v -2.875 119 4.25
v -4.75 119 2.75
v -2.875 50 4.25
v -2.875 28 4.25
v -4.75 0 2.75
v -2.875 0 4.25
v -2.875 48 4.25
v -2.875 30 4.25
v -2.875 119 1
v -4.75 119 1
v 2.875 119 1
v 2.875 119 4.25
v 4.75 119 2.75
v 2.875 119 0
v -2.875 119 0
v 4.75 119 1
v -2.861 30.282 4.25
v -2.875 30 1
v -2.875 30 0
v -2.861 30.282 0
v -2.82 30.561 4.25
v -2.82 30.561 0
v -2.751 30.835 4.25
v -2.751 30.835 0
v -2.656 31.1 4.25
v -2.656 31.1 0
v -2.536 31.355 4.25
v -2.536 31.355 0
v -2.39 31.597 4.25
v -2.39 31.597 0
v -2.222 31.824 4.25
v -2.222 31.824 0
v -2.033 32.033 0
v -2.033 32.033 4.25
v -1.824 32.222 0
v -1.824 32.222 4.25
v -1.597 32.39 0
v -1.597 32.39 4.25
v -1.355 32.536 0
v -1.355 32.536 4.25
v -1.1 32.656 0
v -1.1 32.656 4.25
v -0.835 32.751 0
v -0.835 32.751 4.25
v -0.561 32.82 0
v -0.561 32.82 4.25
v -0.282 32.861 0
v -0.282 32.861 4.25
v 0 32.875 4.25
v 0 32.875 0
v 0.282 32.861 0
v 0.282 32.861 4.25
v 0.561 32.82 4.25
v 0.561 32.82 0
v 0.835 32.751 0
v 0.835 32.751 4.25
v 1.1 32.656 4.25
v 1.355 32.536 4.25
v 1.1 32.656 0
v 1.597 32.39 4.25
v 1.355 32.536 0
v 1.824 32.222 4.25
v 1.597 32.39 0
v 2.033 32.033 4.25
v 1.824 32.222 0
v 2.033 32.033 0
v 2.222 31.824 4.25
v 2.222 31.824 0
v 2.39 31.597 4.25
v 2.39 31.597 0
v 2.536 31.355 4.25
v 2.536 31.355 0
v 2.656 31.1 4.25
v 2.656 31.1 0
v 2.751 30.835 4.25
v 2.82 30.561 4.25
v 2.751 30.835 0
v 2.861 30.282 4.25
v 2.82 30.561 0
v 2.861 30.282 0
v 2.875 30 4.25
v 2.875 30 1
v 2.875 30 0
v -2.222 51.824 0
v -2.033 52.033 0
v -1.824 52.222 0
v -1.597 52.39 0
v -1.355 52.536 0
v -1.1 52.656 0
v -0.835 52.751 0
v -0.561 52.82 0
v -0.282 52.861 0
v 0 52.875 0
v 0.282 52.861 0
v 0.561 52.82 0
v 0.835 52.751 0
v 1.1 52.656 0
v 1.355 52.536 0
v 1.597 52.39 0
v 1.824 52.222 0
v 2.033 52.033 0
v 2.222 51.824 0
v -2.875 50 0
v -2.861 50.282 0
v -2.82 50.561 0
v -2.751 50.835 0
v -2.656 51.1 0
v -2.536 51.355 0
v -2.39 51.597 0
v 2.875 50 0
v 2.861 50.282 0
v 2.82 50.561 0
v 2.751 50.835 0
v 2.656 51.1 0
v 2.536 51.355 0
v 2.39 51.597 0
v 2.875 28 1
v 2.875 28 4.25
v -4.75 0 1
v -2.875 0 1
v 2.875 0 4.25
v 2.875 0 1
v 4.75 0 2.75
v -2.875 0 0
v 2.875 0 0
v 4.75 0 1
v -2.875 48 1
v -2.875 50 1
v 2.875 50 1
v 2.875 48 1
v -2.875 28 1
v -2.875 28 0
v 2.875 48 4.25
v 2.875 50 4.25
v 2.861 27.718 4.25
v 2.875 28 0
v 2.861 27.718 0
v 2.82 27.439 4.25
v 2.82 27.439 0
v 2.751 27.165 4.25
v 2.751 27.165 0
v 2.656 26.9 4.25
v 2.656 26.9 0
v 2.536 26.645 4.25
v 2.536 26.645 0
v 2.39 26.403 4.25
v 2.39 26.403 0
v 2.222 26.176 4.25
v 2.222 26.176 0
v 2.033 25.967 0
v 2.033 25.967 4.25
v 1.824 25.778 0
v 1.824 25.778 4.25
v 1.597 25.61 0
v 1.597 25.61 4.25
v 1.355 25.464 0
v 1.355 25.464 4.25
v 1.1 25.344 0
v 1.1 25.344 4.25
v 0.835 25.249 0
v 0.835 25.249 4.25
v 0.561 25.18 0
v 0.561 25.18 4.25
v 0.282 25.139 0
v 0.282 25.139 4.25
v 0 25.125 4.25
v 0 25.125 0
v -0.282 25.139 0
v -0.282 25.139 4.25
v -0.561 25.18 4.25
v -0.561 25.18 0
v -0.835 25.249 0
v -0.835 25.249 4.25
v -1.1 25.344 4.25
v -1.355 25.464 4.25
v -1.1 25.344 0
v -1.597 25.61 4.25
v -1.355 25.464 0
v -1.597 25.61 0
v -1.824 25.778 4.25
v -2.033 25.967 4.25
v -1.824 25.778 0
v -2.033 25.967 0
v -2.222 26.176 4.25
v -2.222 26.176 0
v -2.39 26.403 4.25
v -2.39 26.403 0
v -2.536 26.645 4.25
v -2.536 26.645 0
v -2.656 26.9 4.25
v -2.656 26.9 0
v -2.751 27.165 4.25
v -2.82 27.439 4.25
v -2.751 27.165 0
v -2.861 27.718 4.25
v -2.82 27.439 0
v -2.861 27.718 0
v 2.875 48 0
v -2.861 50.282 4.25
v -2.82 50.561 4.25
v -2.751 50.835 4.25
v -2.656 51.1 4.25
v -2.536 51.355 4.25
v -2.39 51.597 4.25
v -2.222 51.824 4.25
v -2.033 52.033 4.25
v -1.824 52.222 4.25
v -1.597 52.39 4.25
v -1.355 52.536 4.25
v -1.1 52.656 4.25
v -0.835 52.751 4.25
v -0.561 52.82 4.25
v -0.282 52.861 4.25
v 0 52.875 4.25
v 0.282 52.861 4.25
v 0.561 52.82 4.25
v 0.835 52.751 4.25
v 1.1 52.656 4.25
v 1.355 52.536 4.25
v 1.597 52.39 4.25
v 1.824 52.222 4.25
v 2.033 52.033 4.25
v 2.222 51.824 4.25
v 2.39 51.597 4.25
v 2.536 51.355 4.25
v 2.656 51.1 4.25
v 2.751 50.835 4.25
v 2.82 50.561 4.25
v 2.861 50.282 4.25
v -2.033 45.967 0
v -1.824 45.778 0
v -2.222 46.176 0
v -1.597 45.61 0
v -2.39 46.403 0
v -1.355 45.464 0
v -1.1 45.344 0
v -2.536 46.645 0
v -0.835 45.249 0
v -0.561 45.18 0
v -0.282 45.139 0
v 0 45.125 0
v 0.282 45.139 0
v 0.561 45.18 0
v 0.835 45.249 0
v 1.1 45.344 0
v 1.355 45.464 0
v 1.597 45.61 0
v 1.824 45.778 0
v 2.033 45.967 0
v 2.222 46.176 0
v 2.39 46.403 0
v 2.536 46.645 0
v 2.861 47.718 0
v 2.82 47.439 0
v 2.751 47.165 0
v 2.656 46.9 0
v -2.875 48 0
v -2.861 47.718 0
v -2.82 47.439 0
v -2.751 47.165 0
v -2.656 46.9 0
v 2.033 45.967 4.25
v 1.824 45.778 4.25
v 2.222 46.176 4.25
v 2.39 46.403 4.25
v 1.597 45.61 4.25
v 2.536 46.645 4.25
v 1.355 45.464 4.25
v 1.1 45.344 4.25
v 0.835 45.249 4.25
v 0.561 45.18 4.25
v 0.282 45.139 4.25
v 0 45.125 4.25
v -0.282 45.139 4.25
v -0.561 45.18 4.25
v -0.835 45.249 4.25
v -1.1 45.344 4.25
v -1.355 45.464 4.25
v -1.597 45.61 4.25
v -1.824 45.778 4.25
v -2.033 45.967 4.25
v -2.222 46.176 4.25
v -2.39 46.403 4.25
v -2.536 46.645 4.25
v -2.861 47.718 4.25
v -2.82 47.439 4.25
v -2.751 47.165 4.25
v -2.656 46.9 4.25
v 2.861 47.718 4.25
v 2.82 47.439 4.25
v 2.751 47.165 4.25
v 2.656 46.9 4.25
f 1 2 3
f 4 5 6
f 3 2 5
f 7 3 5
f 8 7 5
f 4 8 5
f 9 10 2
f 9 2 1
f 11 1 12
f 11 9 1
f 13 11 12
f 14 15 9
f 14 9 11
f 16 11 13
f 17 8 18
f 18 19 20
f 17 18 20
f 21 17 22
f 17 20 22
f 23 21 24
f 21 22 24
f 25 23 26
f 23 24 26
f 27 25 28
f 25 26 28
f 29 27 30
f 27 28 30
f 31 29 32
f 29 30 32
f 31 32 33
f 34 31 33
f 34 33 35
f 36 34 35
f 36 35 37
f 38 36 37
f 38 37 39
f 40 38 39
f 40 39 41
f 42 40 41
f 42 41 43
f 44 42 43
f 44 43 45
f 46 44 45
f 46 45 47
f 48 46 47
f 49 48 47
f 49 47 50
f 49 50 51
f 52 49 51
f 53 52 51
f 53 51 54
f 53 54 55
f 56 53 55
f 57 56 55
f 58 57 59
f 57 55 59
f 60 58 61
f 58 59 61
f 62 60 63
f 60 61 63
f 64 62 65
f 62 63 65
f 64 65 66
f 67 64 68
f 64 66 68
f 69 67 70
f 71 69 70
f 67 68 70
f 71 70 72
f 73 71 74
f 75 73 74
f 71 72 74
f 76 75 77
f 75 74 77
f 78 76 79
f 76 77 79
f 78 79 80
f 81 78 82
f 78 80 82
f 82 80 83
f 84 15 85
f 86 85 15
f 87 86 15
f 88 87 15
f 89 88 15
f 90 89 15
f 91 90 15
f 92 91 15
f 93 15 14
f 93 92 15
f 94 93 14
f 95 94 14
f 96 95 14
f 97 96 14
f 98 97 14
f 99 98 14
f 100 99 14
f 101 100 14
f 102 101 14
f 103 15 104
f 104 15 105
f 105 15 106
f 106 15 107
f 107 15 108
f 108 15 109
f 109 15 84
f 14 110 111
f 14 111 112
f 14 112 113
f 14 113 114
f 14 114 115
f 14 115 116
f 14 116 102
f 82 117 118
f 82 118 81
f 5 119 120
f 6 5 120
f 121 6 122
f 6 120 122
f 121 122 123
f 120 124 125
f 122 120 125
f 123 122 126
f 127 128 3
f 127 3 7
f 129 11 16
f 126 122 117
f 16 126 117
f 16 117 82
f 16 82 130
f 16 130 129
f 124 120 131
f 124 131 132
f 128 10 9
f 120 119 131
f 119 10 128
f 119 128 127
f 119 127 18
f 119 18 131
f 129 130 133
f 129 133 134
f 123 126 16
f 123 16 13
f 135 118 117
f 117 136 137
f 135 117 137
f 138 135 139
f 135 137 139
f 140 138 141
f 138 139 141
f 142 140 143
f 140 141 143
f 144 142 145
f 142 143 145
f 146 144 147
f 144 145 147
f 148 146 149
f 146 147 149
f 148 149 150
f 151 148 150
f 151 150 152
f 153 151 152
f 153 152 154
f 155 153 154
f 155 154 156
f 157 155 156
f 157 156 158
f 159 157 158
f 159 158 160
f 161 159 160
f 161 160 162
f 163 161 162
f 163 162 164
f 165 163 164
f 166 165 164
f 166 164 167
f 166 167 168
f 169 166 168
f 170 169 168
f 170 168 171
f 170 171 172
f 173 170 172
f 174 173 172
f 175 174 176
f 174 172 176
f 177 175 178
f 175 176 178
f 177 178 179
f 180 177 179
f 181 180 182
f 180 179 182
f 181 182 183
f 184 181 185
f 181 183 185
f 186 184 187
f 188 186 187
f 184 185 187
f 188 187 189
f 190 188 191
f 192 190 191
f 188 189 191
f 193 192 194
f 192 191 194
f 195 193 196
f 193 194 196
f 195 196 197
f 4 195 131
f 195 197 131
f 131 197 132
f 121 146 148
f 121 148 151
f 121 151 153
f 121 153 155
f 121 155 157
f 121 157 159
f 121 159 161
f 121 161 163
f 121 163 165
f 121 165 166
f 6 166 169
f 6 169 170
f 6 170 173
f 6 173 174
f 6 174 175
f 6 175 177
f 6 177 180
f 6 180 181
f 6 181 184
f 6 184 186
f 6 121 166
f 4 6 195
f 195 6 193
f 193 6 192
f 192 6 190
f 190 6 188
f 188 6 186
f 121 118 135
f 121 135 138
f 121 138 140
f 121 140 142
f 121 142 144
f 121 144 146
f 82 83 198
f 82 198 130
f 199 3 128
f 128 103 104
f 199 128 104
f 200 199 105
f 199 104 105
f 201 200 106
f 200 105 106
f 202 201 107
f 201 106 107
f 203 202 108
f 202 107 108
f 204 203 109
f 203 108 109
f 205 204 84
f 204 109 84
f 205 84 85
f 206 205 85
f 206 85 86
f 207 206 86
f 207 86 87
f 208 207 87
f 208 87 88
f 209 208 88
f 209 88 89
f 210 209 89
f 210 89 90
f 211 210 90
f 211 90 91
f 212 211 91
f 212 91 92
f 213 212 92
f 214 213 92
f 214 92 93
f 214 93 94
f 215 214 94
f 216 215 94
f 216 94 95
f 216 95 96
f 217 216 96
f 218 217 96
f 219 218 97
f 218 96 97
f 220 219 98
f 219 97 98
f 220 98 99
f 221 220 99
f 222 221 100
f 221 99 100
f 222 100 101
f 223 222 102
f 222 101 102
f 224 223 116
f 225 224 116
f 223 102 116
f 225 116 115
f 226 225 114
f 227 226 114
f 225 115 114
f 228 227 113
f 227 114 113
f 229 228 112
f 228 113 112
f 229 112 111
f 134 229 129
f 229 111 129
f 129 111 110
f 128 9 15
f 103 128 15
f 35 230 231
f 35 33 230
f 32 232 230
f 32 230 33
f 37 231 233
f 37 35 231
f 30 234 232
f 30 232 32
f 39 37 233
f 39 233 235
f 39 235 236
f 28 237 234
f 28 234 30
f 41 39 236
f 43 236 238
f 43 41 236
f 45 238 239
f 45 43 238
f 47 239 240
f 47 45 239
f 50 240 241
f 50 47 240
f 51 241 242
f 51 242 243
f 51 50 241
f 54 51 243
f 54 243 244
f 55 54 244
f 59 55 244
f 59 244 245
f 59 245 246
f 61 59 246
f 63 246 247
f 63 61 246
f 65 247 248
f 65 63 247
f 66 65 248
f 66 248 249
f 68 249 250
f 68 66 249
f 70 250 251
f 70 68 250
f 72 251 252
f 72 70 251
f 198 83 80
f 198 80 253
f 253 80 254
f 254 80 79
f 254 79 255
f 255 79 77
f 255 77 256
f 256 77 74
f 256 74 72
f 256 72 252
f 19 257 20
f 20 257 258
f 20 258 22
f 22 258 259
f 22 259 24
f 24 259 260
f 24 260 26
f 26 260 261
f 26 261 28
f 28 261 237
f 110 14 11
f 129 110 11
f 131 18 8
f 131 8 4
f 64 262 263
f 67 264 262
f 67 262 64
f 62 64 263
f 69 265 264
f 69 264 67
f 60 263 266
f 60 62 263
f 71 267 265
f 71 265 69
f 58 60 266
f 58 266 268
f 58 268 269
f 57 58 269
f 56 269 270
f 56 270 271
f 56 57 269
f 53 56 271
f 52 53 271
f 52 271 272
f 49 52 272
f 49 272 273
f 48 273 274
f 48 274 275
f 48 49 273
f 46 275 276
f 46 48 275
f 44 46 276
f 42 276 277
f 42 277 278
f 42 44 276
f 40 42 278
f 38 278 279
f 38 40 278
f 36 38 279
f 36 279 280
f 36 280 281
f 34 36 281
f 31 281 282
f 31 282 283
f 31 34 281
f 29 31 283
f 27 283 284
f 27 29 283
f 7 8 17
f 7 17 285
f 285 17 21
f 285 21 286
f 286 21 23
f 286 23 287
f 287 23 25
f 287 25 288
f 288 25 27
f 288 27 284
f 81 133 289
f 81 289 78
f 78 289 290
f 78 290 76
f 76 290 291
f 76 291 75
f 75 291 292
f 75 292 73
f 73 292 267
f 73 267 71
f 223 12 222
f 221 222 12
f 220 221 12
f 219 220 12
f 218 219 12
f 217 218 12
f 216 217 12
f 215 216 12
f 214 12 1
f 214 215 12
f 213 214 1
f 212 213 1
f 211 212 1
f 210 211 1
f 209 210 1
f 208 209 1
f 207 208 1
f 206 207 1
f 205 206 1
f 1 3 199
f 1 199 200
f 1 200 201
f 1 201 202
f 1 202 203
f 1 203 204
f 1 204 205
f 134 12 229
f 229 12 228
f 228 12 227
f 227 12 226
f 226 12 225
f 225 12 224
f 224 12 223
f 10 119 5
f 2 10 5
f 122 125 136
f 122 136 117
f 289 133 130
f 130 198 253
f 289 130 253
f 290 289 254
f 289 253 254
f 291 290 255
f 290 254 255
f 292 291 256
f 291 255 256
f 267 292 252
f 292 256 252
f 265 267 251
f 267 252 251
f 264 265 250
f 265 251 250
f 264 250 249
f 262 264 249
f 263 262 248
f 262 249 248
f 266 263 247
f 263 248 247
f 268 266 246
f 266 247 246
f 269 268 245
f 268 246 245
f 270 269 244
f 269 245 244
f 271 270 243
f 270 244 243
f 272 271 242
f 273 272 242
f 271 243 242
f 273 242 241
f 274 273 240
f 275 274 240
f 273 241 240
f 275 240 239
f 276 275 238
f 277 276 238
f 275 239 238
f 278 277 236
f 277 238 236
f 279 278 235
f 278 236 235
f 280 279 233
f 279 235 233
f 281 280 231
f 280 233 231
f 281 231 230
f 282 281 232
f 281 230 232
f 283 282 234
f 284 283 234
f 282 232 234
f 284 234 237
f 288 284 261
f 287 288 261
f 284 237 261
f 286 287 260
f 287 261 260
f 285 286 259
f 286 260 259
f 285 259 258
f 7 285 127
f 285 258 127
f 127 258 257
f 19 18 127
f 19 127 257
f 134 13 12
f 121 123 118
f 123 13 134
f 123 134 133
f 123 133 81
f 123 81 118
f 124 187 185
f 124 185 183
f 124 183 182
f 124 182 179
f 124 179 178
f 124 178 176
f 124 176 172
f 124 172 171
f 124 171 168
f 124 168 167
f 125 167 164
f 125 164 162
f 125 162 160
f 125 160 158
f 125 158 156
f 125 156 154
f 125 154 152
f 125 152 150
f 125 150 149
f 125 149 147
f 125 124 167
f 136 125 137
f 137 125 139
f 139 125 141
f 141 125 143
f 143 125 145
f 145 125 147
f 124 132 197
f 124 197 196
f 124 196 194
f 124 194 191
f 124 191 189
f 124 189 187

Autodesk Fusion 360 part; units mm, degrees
sketch "BaseProfile" plane through (0, 0, 0) normal (0, 1, 0) x (1, 0, 0)
  line L0 (-2.875, 0) -> (2.875, 0)
  line L1 (2.875, 0) -> (2.875, -1)
  line L2 (2.875, -1) -> (4.75, -1)
  line L3 (2.875, -4.25) -> (-2.875, -4.25)
  line L4 (-4.75, -1) -> (-2.875, -1)
  line L5 (-2.875, -1) -> (-2.875, 0)
  line L6 (-4.75, -1) -> (-4.75, -2.75)
  line L7 (-4.75, -2.75) -> (-2.875, -4.25)
  line L8 (4.75, -1) -> (4.75, -2.75)
  line L9 (4.75, -2.75) -> (2.875, -4.25)
  line L10 (0, 7.3711) -> (0, -7.6289)
  dimension "d1" = 5.75
  dimension "d2" = 5.75
  dimension "d3" = 9.5
  dimension "d4" = 1
  dimension "d7" = 1.75
  dimension "d8" = 1.5
extrude "4mmExt" add sketch "BaseProfile" along normal blind 4 makes body 1
extrude "104mmExt" add sketch "BaseProfile" along normal blind 104 separate body makes body 2
extrude "139mmExt" add sketch "BaseProfile" along normal blind 139 separate body makes body 3
extrude "24mmExt" add sketch "BaseProfile" along normal blind 24 separate body makes body 4
extrude "94mmExt (1)" add sketch "BaseProfile" along normal blind 94 separate body makes body 5
sketch "14mm34mm" plane through (0, 0, 0) normal (0, 0, 1) x (1, 0, 0)
  line L0 (-2.875, 15) -> (-2.875, 13)
  arc A0 (-2.875, 13) -> (2.875, 13) centre (0, 13) ccw
  line L1 (2.875, 13) -> (2.875, 15)
  arc A1 (2.875, 15) -> (-2.875, 15) centre (0, 15) ccw
  line L2 (0, 15) -> (0, 13) construction
  line L3 (-2.875, 35) -> (-2.875, 33)
  arc A2 (-2.875, 33) -> (2.875, 33) centre (0, 33) ccw
  line L4 (2.875, 33) -> (2.875, 35)
  arc A3 (2.875, 35) -> (-2.875, 35) centre (0, 35) ccw
  line L5 (0, 35) -> (0, 33) construction
  point P0 (0, 14)
  point P1 (0, 34)
  dimension "d19" = 5.75
  dimension "d20" = 14
  dimension "d21" = 1
  dimension "d42" = 5.75
  dimension "d43" = 20
  dimension "d44" = 1
extrude "14mm34mmCut" cut sketch "14mm34mm" along normal through all bodies 5
extrude "Extrude7" add sketch "BaseProfile" along normal blind 119 separate body makes body 6
sketch "29mm49mm" plane through (0, 0, 0) normal (0, 0, 1) x (1, 0, 0)
  line L0 (-2.875, 30) -> (-2.875, 28)
  arc A0 (-2.875, 28) -> (2.875, 28) centre (0, 28) ccw
  line L1 (2.875, 28) -> (2.875, 30)
  arc A1 (2.875, 30) -> (-2.875, 30) centre (0, 30) ccw
  line L2 (0, 30) -> (0, 28) construction
  line L3 (-2.875, 50) -> (-2.875, 48)
  arc A2 (-2.875, 48) -> (2.875, 48) centre (0, 48) ccw
  line L4 (2.875, 48) -> (2.875, 50)
  arc A3 (2.875, 50) -> (-2.875, 50) centre (0, 50) ccw
  line L5 (0, 50) -> (0, 48) construction
  point P0 (0, 29)
  point P1 (0, 49)
  dimension "d27" = 5.75
  dimension "d28" = 1
  dimension "d29" = 29
  dimension "d30" = 5.75
  dimension "d31" = 20
  dimension "d32" = 1
extrude "29mm49mmCut" cut sketch "29mm49mm" along normal through all bodies 6
extrude "23mmExt" add sketch "BaseProfile" along normal blind 24 separate body makes body 7
sketch "14mm" plane through (0, 0, 0) normal (0, 0, 1) x (1, 0, 0)
  line L0 (-2.875, 15) -> (-2.875, 13)
  arc A0 (-2.875, 13) -> (2.875, 13) centre (0, 13) ccw
  line L1 (2.875, 13) -> (2.875, 15)
  arc A1 (2.875, 15) -> (-2.875, 15) centre (0, 15) ccw
  line L2 (0, 15) -> (0, 13) construction
  point P0 (0, 14)
  dimension "d36" = 5.75
  dimension "d37" = 1
  dimension "d38" = 14
extrude "14mmCut" cut sketch "14mm" along normal through all bodies 7
extrude "94mmExt" add sketch "BaseProfile" along normal blind 94 separate body makes body 8
hidden bodies 1 2 3 4 5 7 8
equation "d8 = 3.25 mm - 1.75 mm"
